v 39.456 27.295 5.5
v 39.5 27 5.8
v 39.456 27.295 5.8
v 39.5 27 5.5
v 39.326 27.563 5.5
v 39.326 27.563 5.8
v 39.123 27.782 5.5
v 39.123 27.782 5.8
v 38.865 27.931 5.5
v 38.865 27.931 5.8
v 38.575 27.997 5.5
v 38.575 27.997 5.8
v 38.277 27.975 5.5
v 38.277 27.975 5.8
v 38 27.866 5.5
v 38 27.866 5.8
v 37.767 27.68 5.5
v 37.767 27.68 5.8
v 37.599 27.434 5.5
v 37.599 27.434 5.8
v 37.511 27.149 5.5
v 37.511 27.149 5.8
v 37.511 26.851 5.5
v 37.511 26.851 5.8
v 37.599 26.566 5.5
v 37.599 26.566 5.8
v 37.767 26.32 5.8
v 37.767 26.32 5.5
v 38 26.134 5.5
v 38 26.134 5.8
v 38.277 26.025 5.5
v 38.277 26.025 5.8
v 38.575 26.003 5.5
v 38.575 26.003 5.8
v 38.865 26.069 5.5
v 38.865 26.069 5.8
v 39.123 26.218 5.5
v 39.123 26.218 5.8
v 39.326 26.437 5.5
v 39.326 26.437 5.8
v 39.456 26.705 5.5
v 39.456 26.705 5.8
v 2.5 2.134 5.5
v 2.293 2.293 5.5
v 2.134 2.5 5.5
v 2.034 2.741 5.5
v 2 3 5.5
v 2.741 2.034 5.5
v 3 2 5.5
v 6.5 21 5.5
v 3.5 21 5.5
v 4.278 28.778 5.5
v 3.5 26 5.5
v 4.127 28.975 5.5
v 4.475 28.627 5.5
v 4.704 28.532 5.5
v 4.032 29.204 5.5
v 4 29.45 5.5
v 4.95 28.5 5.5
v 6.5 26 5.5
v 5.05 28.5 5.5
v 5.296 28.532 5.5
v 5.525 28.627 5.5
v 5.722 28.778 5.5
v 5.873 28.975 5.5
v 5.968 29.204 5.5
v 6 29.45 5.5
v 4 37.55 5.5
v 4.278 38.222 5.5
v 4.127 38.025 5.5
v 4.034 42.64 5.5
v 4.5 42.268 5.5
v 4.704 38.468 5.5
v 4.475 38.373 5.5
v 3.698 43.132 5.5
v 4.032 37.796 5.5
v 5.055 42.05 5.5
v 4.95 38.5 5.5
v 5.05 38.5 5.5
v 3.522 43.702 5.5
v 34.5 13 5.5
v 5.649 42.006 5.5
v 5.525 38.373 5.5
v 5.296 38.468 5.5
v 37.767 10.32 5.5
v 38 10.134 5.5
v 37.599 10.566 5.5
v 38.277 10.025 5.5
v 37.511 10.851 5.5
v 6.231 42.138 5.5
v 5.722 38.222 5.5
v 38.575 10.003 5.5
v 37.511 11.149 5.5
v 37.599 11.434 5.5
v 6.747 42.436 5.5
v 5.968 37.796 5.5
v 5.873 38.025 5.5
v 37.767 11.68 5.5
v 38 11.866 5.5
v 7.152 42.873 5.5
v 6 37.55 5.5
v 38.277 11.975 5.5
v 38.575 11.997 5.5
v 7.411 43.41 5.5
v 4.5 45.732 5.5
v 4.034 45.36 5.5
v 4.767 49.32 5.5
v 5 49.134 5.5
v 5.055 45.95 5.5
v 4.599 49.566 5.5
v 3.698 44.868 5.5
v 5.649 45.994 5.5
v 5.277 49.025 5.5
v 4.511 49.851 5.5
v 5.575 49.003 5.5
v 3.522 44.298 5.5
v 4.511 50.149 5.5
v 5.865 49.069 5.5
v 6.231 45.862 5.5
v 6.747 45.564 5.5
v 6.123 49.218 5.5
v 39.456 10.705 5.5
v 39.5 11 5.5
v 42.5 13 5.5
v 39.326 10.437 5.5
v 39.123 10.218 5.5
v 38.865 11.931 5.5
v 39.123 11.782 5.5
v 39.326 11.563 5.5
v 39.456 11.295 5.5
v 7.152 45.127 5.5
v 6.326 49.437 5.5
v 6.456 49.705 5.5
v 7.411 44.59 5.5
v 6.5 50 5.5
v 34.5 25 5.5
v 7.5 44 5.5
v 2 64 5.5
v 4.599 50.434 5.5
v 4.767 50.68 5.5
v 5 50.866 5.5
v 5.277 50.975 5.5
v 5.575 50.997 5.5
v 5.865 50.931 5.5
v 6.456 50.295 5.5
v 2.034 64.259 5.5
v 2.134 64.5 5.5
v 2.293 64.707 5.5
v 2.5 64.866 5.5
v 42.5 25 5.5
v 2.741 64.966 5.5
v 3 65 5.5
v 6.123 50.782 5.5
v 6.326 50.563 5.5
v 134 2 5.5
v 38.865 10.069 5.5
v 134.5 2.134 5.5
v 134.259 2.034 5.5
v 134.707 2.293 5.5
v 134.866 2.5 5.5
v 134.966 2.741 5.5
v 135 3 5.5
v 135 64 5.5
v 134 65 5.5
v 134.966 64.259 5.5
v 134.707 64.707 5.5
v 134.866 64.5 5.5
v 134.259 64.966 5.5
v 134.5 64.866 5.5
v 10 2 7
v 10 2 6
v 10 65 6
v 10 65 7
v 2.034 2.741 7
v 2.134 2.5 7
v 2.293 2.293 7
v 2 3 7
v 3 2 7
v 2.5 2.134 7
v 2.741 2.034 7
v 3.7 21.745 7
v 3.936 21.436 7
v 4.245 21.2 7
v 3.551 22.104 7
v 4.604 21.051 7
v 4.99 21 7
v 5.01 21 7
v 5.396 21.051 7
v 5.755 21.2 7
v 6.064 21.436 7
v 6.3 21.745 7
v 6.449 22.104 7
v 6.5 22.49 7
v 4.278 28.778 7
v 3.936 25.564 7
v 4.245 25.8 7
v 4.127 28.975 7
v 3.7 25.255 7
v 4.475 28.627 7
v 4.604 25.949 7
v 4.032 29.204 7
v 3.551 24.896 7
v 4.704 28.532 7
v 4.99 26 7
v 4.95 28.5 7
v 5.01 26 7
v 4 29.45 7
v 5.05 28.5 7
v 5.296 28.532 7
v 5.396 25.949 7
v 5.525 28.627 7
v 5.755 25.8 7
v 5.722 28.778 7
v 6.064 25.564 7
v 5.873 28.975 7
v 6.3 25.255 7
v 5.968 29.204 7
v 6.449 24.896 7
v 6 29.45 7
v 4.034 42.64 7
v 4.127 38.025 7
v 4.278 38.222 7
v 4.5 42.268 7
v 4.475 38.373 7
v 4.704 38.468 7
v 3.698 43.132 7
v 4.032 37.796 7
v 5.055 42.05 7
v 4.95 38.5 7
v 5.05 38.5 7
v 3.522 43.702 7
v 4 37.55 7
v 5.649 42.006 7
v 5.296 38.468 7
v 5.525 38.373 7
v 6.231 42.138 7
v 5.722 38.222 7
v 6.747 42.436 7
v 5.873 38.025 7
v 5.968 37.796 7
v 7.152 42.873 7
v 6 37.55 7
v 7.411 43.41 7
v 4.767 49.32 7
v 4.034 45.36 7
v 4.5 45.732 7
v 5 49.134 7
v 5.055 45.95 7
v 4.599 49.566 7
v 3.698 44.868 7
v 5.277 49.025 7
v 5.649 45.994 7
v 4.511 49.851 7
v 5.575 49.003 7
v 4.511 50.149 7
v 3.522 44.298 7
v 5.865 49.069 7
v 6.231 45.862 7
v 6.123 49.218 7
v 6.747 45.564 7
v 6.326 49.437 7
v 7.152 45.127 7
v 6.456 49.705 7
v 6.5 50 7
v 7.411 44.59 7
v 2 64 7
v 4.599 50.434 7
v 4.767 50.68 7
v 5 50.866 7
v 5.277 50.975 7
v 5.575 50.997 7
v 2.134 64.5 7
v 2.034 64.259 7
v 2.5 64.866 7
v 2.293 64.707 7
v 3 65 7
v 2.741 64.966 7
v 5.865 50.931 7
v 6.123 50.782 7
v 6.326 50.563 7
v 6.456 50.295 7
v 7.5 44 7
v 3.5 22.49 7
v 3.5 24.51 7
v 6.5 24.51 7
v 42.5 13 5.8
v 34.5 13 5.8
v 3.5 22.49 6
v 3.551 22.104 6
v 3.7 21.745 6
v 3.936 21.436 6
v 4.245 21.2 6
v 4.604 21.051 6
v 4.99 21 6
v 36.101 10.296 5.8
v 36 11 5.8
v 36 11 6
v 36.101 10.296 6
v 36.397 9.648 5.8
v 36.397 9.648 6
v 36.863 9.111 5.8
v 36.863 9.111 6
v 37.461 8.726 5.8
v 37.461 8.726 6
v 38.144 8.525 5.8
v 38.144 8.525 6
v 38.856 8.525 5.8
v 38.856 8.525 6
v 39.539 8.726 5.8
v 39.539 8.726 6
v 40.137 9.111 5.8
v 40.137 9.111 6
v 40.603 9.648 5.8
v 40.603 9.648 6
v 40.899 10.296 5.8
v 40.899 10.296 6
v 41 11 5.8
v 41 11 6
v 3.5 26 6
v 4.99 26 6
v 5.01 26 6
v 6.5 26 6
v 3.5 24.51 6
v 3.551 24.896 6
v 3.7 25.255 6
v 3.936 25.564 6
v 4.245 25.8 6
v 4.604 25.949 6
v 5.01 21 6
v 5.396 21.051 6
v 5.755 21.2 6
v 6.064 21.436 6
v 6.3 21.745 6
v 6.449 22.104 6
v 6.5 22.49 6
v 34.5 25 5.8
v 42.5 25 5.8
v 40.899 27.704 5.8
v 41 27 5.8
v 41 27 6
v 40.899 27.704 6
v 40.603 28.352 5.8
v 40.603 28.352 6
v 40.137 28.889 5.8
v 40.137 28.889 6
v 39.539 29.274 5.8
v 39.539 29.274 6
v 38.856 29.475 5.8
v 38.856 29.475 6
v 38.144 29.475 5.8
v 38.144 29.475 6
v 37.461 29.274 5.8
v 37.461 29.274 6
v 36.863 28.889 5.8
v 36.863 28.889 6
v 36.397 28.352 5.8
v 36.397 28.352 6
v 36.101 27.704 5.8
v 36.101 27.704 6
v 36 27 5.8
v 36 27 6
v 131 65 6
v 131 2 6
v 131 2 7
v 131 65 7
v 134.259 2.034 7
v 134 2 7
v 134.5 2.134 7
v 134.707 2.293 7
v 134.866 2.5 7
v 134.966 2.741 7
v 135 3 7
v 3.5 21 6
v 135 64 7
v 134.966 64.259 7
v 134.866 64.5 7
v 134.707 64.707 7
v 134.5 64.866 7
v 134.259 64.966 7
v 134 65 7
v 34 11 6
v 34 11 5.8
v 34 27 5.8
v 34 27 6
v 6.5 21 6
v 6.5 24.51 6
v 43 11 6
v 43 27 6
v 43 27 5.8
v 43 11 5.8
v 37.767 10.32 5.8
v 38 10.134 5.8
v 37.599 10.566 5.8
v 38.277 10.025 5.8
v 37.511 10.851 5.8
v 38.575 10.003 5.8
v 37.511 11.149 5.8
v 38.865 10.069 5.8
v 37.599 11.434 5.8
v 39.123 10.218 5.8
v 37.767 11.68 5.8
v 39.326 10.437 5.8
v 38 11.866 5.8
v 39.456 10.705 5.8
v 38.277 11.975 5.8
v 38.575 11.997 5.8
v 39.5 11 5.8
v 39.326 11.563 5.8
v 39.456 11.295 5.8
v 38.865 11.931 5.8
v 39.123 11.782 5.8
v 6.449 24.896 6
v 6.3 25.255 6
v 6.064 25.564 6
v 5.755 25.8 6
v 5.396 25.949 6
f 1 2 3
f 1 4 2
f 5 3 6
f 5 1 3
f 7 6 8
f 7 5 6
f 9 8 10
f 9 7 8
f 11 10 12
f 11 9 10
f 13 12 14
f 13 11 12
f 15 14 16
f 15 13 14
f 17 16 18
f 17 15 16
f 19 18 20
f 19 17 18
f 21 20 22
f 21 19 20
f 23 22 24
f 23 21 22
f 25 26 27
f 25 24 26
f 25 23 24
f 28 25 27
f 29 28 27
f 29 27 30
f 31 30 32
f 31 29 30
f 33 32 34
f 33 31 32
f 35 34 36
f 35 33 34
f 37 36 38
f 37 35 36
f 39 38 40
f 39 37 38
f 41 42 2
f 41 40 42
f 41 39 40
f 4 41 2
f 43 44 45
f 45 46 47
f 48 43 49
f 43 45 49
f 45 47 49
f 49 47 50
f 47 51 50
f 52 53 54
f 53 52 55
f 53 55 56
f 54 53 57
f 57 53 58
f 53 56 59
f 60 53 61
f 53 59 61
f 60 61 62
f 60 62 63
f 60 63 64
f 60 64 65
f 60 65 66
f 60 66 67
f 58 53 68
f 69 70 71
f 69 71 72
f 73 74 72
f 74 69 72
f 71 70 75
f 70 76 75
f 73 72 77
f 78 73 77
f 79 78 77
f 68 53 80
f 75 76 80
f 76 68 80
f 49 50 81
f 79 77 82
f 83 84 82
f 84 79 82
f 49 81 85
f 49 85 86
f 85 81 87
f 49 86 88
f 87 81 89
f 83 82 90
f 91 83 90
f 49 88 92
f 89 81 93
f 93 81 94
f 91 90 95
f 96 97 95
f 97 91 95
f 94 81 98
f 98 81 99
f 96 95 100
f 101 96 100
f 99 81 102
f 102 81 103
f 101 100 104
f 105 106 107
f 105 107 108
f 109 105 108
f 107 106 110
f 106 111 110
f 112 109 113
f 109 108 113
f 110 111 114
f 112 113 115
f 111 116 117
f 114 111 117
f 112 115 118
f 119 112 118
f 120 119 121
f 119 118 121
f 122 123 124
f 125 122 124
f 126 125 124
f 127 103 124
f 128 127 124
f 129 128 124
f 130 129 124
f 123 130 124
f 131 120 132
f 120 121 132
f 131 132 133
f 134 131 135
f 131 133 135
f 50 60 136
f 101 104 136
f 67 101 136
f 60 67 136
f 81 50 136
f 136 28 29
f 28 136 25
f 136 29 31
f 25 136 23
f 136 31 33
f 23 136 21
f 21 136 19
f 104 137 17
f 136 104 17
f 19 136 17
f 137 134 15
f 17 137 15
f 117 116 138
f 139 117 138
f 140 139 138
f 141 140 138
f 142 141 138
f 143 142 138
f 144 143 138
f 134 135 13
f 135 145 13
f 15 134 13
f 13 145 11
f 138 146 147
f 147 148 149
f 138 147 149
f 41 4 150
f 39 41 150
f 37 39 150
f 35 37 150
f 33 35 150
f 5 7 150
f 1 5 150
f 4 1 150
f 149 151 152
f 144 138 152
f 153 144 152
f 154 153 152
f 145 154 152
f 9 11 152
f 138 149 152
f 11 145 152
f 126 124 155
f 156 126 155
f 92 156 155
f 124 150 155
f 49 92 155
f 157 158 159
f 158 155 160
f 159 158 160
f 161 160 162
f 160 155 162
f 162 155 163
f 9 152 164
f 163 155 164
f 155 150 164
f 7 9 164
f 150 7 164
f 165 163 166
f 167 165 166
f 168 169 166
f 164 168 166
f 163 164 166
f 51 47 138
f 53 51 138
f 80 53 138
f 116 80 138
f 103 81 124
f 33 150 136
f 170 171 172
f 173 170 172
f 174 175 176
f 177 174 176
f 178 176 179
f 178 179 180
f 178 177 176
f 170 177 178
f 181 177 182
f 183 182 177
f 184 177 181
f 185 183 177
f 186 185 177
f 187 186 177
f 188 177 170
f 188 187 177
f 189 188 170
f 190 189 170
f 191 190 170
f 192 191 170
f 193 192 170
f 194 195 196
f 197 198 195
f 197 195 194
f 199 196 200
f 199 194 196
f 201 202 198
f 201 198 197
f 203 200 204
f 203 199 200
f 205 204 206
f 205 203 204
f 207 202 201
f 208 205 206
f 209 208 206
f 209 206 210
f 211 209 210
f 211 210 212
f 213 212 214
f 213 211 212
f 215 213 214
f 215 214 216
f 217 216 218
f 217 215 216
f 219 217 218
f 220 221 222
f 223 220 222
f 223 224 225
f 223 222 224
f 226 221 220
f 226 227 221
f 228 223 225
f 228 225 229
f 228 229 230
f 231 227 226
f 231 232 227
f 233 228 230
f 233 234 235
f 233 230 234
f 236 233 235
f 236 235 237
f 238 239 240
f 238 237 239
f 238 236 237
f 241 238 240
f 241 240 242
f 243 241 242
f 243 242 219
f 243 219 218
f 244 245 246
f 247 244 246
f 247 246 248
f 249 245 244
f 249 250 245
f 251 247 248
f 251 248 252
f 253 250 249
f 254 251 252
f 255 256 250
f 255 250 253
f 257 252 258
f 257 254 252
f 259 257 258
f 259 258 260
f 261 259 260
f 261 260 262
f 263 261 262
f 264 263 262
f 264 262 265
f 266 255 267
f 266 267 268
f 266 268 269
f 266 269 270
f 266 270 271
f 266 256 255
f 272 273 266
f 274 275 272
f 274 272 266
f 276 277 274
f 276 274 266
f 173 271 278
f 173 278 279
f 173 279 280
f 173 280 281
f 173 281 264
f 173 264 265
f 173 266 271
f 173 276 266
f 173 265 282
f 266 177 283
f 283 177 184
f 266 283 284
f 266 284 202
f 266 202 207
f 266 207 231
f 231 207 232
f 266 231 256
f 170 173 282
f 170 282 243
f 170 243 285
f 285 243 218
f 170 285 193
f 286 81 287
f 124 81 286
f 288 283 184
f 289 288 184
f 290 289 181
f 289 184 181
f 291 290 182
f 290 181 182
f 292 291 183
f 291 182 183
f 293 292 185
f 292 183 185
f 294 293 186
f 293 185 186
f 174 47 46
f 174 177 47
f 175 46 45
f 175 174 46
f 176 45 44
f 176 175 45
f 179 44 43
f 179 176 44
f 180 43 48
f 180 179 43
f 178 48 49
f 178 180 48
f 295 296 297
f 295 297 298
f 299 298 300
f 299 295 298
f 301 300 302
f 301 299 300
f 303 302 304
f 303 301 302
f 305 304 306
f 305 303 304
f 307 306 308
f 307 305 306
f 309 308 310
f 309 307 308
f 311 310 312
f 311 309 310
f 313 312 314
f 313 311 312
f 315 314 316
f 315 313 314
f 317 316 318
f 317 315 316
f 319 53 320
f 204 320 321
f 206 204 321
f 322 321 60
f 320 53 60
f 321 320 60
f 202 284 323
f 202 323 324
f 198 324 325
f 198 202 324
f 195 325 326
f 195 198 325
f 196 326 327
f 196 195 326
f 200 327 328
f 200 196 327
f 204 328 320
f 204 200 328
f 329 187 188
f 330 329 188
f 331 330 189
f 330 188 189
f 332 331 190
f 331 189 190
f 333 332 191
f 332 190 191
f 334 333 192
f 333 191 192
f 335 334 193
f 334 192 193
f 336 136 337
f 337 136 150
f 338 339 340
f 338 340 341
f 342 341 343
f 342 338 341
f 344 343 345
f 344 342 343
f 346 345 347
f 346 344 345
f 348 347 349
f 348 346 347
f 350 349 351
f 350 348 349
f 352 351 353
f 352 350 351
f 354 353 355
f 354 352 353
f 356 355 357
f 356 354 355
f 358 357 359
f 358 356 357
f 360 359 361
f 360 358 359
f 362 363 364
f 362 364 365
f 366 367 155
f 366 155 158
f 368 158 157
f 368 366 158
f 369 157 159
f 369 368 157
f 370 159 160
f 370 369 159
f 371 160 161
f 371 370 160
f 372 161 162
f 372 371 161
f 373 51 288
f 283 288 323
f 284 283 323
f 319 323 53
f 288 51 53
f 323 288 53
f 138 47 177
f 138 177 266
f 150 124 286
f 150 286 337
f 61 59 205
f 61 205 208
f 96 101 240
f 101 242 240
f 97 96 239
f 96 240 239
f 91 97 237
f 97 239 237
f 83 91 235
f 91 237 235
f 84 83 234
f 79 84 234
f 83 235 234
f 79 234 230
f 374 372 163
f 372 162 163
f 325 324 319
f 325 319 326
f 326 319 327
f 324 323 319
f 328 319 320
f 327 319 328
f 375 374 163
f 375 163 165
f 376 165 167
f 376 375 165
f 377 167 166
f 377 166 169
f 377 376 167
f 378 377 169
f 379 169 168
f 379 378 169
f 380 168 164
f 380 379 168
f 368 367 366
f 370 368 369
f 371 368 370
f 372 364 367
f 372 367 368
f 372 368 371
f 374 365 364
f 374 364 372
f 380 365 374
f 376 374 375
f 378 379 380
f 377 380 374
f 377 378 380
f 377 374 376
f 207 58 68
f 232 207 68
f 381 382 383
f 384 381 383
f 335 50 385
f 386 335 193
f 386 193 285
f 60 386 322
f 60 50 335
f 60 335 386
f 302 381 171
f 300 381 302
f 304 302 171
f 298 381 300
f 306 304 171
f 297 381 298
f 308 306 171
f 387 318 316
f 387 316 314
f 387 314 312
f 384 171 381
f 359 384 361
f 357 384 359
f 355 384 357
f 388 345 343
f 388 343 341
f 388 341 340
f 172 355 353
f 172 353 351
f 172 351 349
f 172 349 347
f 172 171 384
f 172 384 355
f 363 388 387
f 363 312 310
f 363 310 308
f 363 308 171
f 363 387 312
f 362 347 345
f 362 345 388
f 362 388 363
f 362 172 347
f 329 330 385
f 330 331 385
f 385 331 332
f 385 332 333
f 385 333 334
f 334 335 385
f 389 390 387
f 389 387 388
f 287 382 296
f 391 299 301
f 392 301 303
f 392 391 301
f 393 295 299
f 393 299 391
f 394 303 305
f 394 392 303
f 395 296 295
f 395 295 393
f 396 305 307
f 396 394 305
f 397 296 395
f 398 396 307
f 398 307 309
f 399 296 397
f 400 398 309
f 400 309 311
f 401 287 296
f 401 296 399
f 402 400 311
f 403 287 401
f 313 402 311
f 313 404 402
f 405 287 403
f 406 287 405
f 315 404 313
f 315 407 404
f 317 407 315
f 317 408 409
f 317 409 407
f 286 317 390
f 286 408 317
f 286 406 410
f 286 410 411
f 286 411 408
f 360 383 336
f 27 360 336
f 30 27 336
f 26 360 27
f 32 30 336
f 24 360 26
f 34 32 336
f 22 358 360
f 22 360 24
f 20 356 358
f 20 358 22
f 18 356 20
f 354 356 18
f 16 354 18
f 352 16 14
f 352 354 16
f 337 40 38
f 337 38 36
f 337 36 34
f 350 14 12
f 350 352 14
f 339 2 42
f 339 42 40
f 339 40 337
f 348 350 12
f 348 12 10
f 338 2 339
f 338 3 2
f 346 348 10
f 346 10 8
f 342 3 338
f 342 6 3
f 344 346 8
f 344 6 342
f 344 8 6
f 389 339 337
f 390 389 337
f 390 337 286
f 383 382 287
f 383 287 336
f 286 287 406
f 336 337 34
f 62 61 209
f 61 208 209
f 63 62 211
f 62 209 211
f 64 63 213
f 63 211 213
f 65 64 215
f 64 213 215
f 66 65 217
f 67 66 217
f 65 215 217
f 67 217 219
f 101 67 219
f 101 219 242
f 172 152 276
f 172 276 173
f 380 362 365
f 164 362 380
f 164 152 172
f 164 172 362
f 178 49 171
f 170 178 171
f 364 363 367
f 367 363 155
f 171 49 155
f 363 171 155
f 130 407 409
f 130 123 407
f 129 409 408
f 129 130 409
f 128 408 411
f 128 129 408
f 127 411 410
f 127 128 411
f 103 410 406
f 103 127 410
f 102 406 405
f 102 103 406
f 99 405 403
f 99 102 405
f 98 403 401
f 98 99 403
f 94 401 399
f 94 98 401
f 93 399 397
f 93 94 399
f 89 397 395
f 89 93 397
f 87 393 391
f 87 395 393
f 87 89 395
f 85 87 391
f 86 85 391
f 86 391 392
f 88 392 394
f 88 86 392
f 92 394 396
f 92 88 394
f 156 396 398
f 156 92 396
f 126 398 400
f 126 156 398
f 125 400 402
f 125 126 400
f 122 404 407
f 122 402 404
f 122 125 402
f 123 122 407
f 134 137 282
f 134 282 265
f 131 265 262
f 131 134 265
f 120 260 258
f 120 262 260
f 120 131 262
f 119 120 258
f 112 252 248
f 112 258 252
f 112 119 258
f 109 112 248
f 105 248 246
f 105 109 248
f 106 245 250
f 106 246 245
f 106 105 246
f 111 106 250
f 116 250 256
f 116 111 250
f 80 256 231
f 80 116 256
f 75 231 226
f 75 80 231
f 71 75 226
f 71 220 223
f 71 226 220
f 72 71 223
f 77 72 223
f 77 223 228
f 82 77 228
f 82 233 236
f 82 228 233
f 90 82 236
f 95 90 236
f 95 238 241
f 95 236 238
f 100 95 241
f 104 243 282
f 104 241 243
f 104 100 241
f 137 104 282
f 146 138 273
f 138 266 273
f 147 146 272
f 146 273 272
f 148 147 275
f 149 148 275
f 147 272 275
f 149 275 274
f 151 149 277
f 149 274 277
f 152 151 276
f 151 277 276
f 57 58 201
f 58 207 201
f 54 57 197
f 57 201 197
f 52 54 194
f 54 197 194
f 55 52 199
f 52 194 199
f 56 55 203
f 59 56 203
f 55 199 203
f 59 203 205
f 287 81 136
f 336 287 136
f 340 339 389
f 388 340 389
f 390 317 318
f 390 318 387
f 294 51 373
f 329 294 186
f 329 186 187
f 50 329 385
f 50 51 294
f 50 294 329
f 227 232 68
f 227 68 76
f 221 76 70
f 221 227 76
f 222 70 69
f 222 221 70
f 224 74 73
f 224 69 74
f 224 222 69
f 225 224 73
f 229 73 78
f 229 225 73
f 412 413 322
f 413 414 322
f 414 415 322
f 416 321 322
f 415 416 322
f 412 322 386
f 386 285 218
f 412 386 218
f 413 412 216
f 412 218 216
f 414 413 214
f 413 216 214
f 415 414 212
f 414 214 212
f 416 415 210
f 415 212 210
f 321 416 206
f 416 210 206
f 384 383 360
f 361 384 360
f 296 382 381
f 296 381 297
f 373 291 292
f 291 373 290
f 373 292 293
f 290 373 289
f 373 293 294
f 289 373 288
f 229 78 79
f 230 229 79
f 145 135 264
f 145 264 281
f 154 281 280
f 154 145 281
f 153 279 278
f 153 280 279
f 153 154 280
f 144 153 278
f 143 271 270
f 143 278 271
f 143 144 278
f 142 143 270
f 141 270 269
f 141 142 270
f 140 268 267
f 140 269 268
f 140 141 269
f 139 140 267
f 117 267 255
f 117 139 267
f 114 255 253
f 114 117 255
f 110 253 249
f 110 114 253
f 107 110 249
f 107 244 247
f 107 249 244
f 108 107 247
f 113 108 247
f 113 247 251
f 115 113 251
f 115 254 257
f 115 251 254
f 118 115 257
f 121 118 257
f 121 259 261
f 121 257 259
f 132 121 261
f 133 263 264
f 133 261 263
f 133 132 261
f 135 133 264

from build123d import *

# Parameters (mm, degrees)
BOX016_W          = 2
BOX016_H          = 10
BOX016_DEPTH      = 10
FILLET008_R       = 0.95
BOX017_W          = 3
BOX017_H          = 5
BOX017_DEPTH      = 10
CYLINDER011_R     = 2
CYLINDER011_DEPTH = 10
CYLINDER010_R     = 1
CYLINDER010_DEPTH = 10
CYLINDER005_R     = 1
CYLINDER005_DEPTH = 10
CYLINDER004_R     = 1
CYLINDER004_DEPTH = 10
CYLINDER009_R     = 1.2
CYLINDER009_DEPTH = 0.1
CYLINDER008_R     = 1.2
CYLINDER008_DEPTH = 0.1
BOX011_W          = 9
BOX011_H          = 2
BOX011_DEPTH      = 0.3
BOX012_W          = 9
BOX012_H          = 2
BOX012_DEPTH      = 0.3
CYLINDER006_R     = 1.5
CYLINDER006_DEPTH = 10
CYLINDER007_R     = 1.5
CYLINDER007_DEPTH = 10
BOX010_W          = 8
BOX010_H          = 16
BOX010_DEPTH      = 1.2
CYLINDER003_R     = 2.5
CYLINDER003_DEPTH = 0.3
CYLINDER002_R     = 2.5
CYLINDER002_DEPTH = 0.3
BOX009_W          = 9
BOX009_H          = 16
BOX009_DEPTH      = 0.3
BOX003_W          = 133
BOX003_H          = 63
BOX003_DEPTH      = 0.5
FILLET004_R       = 1
BOX007_W          = 4
BOX007_H          = 63
BOX007_DEPTH      = 1
FILLET006_R       = 1
BOX018_W          = 3
BOX018_H          = 5
BOX018_DEPTH      = 10
FILLET009_R       = 1.49
BOX006_W          = 8
BOX006_H          = 63
BOX006_DEPTH      = 1
FILLET007_R       = 1


with BuildPart() as fillet008:
    # Box016 → Box016 (new body)
    with BuildSketch(Plane(origin=(4, 28.5, 0), x_dir=(1, 0, 0), z_dir=(0, 0, 1))):
        with Locations((1, 5)):
            Rectangle(BOX016_W, BOX016_H)
    extrude(amount=BOX016_DEPTH)

    # Fillet008
    fillet008_edges = [fillet008.edges().sort_by_distance(p)[0] for p in [
        (4, 28.5, 5),
        (4, 38.5, 5),
        (6, 28.5, 5),
        (6, 38.5, 5),
    ]]
    fillet(fillet008_edges, radius=FILLET008_R)


with BuildPart() as cubo011:
    # Box017 → Box017 (new body)
    with BuildSketch(Plane(origin=(3.5, 21, 0), x_dir=(1, 0, 0), z_dir=(0, 0, 1))):
        with Locations((1.5, 2.5)):
            Rectangle(BOX017_W, BOX017_H)
    extrude(amount=BOX017_DEPTH)


with BuildPart() as cilindro011:
    # Cylinder011 → Cylinder011 (new body)
    with BuildSketch(Plane(origin=(5.5, 44, 0), x_dir=(1, 0, 0), z_dir=(0, 0, 1))):
        Circle(CYLINDER011_R)
    extrude(amount=CYLINDER011_DEPTH)


with BuildPart() as cilindro010:
    # Cylinder010 → Cylinder010 (new body)
    with BuildSketch(Plane(origin=(5.5, 50, 0), x_dir=(1, 0, 0), z_dir=(0, 0, 1))):
        Circle(CYLINDER010_R)
    extrude(amount=CYLINDER010_DEPTH)


with BuildPart() as cilindro005:
    # Cylinder005 → Cylinder005 (new body)
    with BuildSketch(Plane(origin=(38.5, 11, 1), x_dir=(1, 0, 0), z_dir=(0, 0, 1))):
        Circle(CYLINDER005_R)
    extrude(amount=CYLINDER005_DEPTH)


with BuildPart() as cilindro004:
    # Cylinder004 → Cylinder004 (new body)
    with BuildSketch(Plane(origin=(38.5, 27, 1), x_dir=(1, 0, 0), z_dir=(0, 0, 1))):
        Circle(CYLINDER004_R)
    extrude(amount=CYLINDER004_DEPTH)


with BuildPart() as cilindro009:
    # Cylinder009 → Cylinder009 (new body)
    with BuildSketch(Plane(origin=(38.5, 27, 1), x_dir=(1, 0, 0), z_dir=(0, 0, 1))):
        Circle(CYLINDER009_R)
    extrude(amount=CYLINDER009_DEPTH)


with BuildPart() as cilindro008:
    # Cylinder008 → Cylinder008 (new body)
    with BuildSketch(Plane(origin=(38.5, 11, 1), x_dir=(1, 0, 0), z_dir=(0, 0, 1))):
        Circle(CYLINDER008_R)
    extrude(amount=CYLINDER008_DEPTH)


with BuildPart() as cubo008:
    # Box011 → Box011 (new body)
    with BuildSketch(Plane(origin=(34, 11, 5.5), x_dir=(1, 0, 0), z_dir=(0, 0, 1))):
        with Locations((4.5, 1)):
            Rectangle(BOX011_W, BOX011_H)
    extrude(amount=BOX011_DEPTH)


with BuildPart() as cubo009:
    # Box012 → Box012 (new body)
    with BuildSketch(Plane(origin=(34, 25, 5.5), x_dir=(1, 0, 0), z_dir=(0, 0, 1))):
        with Locations((4.5, 1)):
            Rectangle(BOX012_W, BOX012_H)
    extrude(amount=BOX012_DEPTH)


with BuildPart() as cilindro006:
    # Cylinder006 → Cylinder006 (new body)
    with BuildSketch(Plane(origin=(38.5, 11, 1), x_dir=(1, 0, 0), z_dir=(0, 0, 1))):
        Circle(CYLINDER006_R)
    extrude(amount=CYLINDER006_DEPTH)


with BuildPart() as cilindro007:
    # Cylinder007 → Cylinder007 (new body)
    with BuildSketch(Plane(origin=(38.5, 27, 1), x_dir=(1, 0, 0), z_dir=(0, 0, 1))):
        Circle(CYLINDER007_R)
    extrude(amount=CYLINDER007_DEPTH)


with BuildPart() as cut008:
    # Box010 → Box010 (new body)
    with BuildSketch(Plane(origin=(34.5, 11, 5), x_dir=(1, 0, 0), z_dir=(0, 0, 1))):
        with Locations((4, 8)):
            Rectangle(BOX010_W, BOX010_H)
    extrude(amount=BOX010_DEPTH)

    # Cut001: cut Cilindro004
    add(cilindro004.part, mode=Mode.SUBTRACT)

    # Cut002: cut Cilindro005
    add(cilindro005.part, mode=Mode.SUBTRACT)

    # Cut007: cut Cilindro007
    add(cilindro007.part, mode=Mode.SUBTRACT)

    # Cut008: cut Cilindro006
    add(cilindro006.part, mode=Mode.SUBTRACT)


with BuildPart() as cilindro003:
    # Cylinder003 → Cylinder003 (new body)
    with BuildSketch(Plane(origin=(38.5, 27, 1), x_dir=(1, 0, 0), z_dir=(0, 0, 1))):
        Circle(CYLINDER003_R)
    extrude(amount=CYLINDER003_DEPTH)


with BuildPart() as cilindro002:
    # Cylinder002 → Cylinder002 (new body)
    with BuildSketch(Plane(origin=(38.5, 11, 1), x_dir=(1, 0, 0), z_dir=(0, 0, 1))):
        Circle(CYLINDER002_R)
    extrude(amount=CYLINDER002_DEPTH)


with BuildPart() as dont_show:
    # Box009 → Box009 (new body)
    with BuildSketch(Plane(origin=(34, 11, 1), x_dir=(1, 0, 0), z_dir=(0, 0, 1))):
        with Locations((4.5, 8)):
            Rectangle(BOX009_W, BOX009_H)
    extrude(amount=BOX009_DEPTH)

    # Fusion001: union Cilindro003, Cilindro002
    add(cilindro003.part)
    add(cilindro002.part)


with BuildPart() as dont_show_1:
    # Fusion001 placement: moved
    add(dont_show.part.moved(Location((0, 0, 4.4))))

    # Cut003: cut Cilindro005
    add(cilindro005.part, mode=Mode.SUBTRACT)

    # Cut004: cut Cilindro004
    add(cilindro004.part, mode=Mode.SUBTRACT)


with BuildPart() as dont_show_2:
    # Cut004 placement: moved
    add(dont_show_1.part.moved(Location((0, 0, 0.4))))

    # Fusion002: union Cut008
    add(cut008.part)


with BuildPart() as cut022:
    # Box003 → Box003 (new body)
    with BuildSketch(Plane(origin=(2, 2, 5.5), x_dir=(1, 0, 0), z_dir=(0, 0, 1))):
        with Locations((66.5, 31.5)):
            Rectangle(BOX003_W, BOX003_H)
    extrude(amount=BOX003_DEPTH)

    # Fillet004
    fillet004_edges = [cut022.edges().sort_by_distance(p)[0] for p in [
        (2, 2, 5.75),
        (2, 65, 5.75),
        (135, 2, 5.75),
        (135, 65, 5.75),
    ]]
    fillet(fillet004_edges, radius=FILLET004_R)

    # Cut009: cut Dont show
    add(dont_show_2.part, mode=Mode.SUBTRACT)

    # Fusion003: union Cubo008, Cubo009
    add(cubo008.part)
    add(cubo009.part)

    # Cut010: cut Cilindro008
    add(cilindro008.part, mode=Mode.SUBTRACT)

    # Cut011: cut Cilindro009
    add(cilindro009.part, mode=Mode.SUBTRACT)

    # Cut012: cut Cilindro004
    add(cilindro004.part, mode=Mode.SUBTRACT)

    # Cut013: cut Cilindro005
    add(cilindro005.part, mode=Mode.SUBTRACT)

    # Cut017: cut Cilindro010
    add(cilindro010.part, mode=Mode.SUBTRACT)

    # Cut019: cut Cilindro011
    add(cilindro011.part, mode=Mode.SUBTRACT)

    # Cut020: cut Cubo011
    add(cubo011.part, mode=Mode.SUBTRACT)

    # Cut022: cut Fillet008
    add(fillet008.part, mode=Mode.SUBTRACT)


with BuildPart() as bottom:
    # Box007 → Box007 (new body)
    with BuildSketch(Plane(origin=(131, 2, 6), x_dir=(1, 0, 0), z_dir=(0, 0, 1))):
        with Locations((2, 31.5)):
            Rectangle(BOX007_W, BOX007_H)
    extrude(amount=BOX007_DEPTH)

    # Fillet006
    fillet006_edges = [bottom.edges().sort_by_distance(p)[0] for p in [
        (135, 2, 6.5),
        (135, 65, 6.5),
    ]]
    fillet(fillet006_edges, radius=FILLET006_R)


with BuildPart() as fillet009:
    # Box018 → Box018 (new body)
    with BuildSketch(Plane(origin=(3.5, 21, 0), x_dir=(1, 0, 0), z_dir=(0, 0, 1))):
        with Locations((1.5, 2.5)):
            Rectangle(BOX018_W, BOX018_H)
    extrude(amount=BOX018_DEPTH)

    # Fillet009
    fillet009_edges = [fillet009.edges().sort_by_distance(p)[0] for p in [
        (3.5, 21, 5),
        (3.5, 26, 5),
        (6.5, 21, 5),
        (6.5, 26, 5),
    ]]
    fillet(fillet009_edges, radius=FILLET009_R)


with BuildPart() as fusion004:
    # Box006 → Box006 (new body)
    with BuildSketch(Plane(origin=(2, 2, 6), x_dir=(1, 0, 0), z_dir=(0, 0, 1))):
        with Locations((4, 31.5)):
            Rectangle(BOX006_W, BOX006_H)
    extrude(amount=BOX006_DEPTH)

    # Fillet007
    fillet007_edges = [fusion004.edges().sort_by_distance(p)[0] for p in [
        (2, 2, 6.5),
        (2, 65, 6.5),
    ]]
    fillet(fillet007_edges, radius=FILLET007_R)

    # Cut015: cut Fillet008
    add(fillet008.part, mode=Mode.SUBTRACT)

    # Cut018: cut Cilindro010
    add(cilindro010.part, mode=Mode.SUBTRACT)

    # Cut021: cut Fillet009
    add(fillet009.part, mode=Mode.SUBTRACT)

    # Cut023: cut Cilindro011
    add(cilindro011.part, mode=Mode.SUBTRACT)

    # Fusion004: union Cut022, Bottom
    add(cut022.part)
    add(bottom.part)


solid = fusion004.part
